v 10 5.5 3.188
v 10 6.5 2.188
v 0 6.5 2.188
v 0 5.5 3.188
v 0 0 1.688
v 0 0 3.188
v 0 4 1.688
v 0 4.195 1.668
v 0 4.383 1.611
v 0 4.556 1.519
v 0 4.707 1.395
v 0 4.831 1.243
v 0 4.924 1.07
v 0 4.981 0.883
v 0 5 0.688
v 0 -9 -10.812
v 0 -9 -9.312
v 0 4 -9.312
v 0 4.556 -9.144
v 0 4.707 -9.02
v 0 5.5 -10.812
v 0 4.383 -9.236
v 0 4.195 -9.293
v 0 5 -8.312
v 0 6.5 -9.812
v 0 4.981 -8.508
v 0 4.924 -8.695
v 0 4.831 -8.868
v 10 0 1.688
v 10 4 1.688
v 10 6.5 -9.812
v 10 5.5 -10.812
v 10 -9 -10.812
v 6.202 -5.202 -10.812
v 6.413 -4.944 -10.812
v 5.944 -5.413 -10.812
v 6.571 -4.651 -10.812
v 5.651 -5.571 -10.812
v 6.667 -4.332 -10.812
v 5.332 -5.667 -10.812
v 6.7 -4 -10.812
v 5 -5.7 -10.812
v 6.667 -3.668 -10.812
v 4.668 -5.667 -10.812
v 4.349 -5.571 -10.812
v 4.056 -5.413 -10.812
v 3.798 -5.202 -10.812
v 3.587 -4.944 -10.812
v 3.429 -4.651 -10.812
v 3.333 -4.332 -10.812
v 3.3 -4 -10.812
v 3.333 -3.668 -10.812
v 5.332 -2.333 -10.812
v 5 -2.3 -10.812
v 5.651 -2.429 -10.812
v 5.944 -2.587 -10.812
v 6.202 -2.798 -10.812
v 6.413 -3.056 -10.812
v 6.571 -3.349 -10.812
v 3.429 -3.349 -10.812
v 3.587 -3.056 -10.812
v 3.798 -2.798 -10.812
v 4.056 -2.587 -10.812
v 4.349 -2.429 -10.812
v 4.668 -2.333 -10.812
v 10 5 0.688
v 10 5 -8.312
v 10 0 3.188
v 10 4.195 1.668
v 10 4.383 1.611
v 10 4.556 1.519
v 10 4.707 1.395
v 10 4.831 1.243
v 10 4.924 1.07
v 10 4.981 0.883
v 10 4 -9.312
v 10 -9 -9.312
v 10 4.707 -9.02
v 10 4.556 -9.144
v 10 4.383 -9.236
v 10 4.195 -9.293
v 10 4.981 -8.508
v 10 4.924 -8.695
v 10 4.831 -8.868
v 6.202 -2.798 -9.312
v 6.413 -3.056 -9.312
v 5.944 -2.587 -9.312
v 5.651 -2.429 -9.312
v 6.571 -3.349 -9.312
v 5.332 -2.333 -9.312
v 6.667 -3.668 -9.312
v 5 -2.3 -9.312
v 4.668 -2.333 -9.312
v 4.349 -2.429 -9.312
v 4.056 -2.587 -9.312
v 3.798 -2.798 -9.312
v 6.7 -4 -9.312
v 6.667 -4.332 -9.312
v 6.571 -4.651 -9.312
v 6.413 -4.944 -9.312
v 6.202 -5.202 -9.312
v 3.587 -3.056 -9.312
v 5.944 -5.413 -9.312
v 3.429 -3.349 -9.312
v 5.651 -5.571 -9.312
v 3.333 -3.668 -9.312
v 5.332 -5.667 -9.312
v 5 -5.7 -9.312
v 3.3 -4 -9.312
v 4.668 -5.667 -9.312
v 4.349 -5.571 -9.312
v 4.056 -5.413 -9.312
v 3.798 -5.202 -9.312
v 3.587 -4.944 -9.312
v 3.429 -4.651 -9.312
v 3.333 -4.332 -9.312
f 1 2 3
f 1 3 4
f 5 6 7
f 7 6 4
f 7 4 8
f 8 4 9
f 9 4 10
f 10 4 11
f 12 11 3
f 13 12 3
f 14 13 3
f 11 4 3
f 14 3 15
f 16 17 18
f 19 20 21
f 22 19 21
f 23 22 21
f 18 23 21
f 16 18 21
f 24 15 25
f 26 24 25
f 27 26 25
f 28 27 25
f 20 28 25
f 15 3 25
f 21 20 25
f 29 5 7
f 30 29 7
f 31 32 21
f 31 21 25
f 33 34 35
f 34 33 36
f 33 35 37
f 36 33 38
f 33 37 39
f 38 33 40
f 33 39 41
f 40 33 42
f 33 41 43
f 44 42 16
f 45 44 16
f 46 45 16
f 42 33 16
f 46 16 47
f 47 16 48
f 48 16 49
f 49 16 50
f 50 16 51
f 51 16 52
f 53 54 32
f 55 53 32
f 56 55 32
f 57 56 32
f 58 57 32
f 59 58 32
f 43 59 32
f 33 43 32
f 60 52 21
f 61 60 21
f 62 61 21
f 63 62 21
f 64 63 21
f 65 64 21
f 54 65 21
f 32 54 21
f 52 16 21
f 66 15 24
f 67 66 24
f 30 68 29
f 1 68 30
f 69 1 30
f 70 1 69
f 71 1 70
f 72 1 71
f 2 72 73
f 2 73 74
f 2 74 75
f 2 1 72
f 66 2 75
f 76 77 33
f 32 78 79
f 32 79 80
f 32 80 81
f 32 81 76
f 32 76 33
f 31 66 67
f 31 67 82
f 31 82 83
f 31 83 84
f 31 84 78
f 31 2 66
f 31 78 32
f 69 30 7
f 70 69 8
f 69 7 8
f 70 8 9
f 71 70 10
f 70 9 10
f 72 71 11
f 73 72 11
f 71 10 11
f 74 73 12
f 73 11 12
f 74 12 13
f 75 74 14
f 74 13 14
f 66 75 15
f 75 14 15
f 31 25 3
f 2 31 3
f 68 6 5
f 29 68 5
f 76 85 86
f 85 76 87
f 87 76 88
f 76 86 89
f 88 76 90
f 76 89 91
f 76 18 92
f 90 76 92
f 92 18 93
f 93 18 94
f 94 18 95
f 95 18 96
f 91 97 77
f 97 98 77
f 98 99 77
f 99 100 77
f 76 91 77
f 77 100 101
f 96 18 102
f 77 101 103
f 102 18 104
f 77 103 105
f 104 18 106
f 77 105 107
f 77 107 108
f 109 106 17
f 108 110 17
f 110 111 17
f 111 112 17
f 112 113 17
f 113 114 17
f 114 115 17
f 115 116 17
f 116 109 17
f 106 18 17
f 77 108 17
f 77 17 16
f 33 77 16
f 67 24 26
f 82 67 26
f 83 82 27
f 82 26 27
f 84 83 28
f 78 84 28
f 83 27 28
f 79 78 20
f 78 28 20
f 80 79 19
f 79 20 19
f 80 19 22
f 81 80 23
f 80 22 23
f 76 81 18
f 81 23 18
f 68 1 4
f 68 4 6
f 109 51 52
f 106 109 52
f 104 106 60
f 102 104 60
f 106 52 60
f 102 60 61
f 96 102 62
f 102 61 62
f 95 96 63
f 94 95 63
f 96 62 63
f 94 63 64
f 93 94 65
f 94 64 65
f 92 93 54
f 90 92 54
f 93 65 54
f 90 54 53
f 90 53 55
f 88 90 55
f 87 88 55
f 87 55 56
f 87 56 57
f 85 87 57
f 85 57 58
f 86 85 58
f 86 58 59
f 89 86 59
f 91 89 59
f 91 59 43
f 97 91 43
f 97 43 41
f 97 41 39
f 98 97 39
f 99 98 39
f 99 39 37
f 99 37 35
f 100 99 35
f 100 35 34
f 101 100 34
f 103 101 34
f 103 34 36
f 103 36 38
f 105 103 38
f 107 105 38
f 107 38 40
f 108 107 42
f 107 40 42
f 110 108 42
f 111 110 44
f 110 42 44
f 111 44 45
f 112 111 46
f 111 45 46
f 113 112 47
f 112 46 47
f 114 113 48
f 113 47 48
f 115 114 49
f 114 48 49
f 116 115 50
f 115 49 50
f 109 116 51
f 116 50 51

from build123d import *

# Parameters (mm, degrees)
BOSS_EXTRUDE1_DEPTH = 10
SKETCH2_R           = 1.7
CUT_EXTRUDE1_DEPTH  = 10


with BuildPart() as part:
    # Sketch1 → Boss-Extrude1 (new body)
    with BuildSketch(Plane(origin=(0, 0, 0), x_dir=(0, 0, -1), z_dir=(1, 0, 0))):
        with BuildLine():
            Line((-2.1875, 6.5), (-3.1875, 5.5))
            Line((-3.1875, 5.5), (-3.1875, 5.296875))
            Line((-3.1875, 5.296875), (-3.1875, 0))
            Line((-3.1875, 0), (-1.6875, 0))
            Line((-1.6875, 0), (-1.6875, 4))
            ThreePointArc((-1.6875, 4), (-1.394606781, 4.707106781), (-0.6875, 5))
            Line((-0.6875, 5), (8.3125, 5))
            ThreePointArc((8.3125, 5), (9.019606781, 4.707106781), (9.3125, 4))
            Line((9.3125, 4), (9.3125, -9))
            Line((9.3125, -9), (10.8125, -9))
            Line((10.8125, -9), (10.8125, 5.5))
            Line((10.8125, 5.5), (9.8125, 6.5))
            Line((9.8125, 6.5), (4.875, 6.5))
            Line((4.875, 6.5), (-2.1875, 6.5))
        make_face()
    extrude(amount=BOSS_EXTRUDE1_DEPTH)

    # Sketch2 → Cut-Extrude1 (cut)
    with BuildSketch(Plane(origin=(0, 0, -10.8125), x_dir=(-1, 0, 0), z_dir=(0, 0, -1))):
        with Locations((-5, -4)):
            Circle(SKETCH2_R)
    extrude(amount=-CUT_EXTRUDE1_DEPTH, mode=Mode.SUBTRACT)


solid = part.part
